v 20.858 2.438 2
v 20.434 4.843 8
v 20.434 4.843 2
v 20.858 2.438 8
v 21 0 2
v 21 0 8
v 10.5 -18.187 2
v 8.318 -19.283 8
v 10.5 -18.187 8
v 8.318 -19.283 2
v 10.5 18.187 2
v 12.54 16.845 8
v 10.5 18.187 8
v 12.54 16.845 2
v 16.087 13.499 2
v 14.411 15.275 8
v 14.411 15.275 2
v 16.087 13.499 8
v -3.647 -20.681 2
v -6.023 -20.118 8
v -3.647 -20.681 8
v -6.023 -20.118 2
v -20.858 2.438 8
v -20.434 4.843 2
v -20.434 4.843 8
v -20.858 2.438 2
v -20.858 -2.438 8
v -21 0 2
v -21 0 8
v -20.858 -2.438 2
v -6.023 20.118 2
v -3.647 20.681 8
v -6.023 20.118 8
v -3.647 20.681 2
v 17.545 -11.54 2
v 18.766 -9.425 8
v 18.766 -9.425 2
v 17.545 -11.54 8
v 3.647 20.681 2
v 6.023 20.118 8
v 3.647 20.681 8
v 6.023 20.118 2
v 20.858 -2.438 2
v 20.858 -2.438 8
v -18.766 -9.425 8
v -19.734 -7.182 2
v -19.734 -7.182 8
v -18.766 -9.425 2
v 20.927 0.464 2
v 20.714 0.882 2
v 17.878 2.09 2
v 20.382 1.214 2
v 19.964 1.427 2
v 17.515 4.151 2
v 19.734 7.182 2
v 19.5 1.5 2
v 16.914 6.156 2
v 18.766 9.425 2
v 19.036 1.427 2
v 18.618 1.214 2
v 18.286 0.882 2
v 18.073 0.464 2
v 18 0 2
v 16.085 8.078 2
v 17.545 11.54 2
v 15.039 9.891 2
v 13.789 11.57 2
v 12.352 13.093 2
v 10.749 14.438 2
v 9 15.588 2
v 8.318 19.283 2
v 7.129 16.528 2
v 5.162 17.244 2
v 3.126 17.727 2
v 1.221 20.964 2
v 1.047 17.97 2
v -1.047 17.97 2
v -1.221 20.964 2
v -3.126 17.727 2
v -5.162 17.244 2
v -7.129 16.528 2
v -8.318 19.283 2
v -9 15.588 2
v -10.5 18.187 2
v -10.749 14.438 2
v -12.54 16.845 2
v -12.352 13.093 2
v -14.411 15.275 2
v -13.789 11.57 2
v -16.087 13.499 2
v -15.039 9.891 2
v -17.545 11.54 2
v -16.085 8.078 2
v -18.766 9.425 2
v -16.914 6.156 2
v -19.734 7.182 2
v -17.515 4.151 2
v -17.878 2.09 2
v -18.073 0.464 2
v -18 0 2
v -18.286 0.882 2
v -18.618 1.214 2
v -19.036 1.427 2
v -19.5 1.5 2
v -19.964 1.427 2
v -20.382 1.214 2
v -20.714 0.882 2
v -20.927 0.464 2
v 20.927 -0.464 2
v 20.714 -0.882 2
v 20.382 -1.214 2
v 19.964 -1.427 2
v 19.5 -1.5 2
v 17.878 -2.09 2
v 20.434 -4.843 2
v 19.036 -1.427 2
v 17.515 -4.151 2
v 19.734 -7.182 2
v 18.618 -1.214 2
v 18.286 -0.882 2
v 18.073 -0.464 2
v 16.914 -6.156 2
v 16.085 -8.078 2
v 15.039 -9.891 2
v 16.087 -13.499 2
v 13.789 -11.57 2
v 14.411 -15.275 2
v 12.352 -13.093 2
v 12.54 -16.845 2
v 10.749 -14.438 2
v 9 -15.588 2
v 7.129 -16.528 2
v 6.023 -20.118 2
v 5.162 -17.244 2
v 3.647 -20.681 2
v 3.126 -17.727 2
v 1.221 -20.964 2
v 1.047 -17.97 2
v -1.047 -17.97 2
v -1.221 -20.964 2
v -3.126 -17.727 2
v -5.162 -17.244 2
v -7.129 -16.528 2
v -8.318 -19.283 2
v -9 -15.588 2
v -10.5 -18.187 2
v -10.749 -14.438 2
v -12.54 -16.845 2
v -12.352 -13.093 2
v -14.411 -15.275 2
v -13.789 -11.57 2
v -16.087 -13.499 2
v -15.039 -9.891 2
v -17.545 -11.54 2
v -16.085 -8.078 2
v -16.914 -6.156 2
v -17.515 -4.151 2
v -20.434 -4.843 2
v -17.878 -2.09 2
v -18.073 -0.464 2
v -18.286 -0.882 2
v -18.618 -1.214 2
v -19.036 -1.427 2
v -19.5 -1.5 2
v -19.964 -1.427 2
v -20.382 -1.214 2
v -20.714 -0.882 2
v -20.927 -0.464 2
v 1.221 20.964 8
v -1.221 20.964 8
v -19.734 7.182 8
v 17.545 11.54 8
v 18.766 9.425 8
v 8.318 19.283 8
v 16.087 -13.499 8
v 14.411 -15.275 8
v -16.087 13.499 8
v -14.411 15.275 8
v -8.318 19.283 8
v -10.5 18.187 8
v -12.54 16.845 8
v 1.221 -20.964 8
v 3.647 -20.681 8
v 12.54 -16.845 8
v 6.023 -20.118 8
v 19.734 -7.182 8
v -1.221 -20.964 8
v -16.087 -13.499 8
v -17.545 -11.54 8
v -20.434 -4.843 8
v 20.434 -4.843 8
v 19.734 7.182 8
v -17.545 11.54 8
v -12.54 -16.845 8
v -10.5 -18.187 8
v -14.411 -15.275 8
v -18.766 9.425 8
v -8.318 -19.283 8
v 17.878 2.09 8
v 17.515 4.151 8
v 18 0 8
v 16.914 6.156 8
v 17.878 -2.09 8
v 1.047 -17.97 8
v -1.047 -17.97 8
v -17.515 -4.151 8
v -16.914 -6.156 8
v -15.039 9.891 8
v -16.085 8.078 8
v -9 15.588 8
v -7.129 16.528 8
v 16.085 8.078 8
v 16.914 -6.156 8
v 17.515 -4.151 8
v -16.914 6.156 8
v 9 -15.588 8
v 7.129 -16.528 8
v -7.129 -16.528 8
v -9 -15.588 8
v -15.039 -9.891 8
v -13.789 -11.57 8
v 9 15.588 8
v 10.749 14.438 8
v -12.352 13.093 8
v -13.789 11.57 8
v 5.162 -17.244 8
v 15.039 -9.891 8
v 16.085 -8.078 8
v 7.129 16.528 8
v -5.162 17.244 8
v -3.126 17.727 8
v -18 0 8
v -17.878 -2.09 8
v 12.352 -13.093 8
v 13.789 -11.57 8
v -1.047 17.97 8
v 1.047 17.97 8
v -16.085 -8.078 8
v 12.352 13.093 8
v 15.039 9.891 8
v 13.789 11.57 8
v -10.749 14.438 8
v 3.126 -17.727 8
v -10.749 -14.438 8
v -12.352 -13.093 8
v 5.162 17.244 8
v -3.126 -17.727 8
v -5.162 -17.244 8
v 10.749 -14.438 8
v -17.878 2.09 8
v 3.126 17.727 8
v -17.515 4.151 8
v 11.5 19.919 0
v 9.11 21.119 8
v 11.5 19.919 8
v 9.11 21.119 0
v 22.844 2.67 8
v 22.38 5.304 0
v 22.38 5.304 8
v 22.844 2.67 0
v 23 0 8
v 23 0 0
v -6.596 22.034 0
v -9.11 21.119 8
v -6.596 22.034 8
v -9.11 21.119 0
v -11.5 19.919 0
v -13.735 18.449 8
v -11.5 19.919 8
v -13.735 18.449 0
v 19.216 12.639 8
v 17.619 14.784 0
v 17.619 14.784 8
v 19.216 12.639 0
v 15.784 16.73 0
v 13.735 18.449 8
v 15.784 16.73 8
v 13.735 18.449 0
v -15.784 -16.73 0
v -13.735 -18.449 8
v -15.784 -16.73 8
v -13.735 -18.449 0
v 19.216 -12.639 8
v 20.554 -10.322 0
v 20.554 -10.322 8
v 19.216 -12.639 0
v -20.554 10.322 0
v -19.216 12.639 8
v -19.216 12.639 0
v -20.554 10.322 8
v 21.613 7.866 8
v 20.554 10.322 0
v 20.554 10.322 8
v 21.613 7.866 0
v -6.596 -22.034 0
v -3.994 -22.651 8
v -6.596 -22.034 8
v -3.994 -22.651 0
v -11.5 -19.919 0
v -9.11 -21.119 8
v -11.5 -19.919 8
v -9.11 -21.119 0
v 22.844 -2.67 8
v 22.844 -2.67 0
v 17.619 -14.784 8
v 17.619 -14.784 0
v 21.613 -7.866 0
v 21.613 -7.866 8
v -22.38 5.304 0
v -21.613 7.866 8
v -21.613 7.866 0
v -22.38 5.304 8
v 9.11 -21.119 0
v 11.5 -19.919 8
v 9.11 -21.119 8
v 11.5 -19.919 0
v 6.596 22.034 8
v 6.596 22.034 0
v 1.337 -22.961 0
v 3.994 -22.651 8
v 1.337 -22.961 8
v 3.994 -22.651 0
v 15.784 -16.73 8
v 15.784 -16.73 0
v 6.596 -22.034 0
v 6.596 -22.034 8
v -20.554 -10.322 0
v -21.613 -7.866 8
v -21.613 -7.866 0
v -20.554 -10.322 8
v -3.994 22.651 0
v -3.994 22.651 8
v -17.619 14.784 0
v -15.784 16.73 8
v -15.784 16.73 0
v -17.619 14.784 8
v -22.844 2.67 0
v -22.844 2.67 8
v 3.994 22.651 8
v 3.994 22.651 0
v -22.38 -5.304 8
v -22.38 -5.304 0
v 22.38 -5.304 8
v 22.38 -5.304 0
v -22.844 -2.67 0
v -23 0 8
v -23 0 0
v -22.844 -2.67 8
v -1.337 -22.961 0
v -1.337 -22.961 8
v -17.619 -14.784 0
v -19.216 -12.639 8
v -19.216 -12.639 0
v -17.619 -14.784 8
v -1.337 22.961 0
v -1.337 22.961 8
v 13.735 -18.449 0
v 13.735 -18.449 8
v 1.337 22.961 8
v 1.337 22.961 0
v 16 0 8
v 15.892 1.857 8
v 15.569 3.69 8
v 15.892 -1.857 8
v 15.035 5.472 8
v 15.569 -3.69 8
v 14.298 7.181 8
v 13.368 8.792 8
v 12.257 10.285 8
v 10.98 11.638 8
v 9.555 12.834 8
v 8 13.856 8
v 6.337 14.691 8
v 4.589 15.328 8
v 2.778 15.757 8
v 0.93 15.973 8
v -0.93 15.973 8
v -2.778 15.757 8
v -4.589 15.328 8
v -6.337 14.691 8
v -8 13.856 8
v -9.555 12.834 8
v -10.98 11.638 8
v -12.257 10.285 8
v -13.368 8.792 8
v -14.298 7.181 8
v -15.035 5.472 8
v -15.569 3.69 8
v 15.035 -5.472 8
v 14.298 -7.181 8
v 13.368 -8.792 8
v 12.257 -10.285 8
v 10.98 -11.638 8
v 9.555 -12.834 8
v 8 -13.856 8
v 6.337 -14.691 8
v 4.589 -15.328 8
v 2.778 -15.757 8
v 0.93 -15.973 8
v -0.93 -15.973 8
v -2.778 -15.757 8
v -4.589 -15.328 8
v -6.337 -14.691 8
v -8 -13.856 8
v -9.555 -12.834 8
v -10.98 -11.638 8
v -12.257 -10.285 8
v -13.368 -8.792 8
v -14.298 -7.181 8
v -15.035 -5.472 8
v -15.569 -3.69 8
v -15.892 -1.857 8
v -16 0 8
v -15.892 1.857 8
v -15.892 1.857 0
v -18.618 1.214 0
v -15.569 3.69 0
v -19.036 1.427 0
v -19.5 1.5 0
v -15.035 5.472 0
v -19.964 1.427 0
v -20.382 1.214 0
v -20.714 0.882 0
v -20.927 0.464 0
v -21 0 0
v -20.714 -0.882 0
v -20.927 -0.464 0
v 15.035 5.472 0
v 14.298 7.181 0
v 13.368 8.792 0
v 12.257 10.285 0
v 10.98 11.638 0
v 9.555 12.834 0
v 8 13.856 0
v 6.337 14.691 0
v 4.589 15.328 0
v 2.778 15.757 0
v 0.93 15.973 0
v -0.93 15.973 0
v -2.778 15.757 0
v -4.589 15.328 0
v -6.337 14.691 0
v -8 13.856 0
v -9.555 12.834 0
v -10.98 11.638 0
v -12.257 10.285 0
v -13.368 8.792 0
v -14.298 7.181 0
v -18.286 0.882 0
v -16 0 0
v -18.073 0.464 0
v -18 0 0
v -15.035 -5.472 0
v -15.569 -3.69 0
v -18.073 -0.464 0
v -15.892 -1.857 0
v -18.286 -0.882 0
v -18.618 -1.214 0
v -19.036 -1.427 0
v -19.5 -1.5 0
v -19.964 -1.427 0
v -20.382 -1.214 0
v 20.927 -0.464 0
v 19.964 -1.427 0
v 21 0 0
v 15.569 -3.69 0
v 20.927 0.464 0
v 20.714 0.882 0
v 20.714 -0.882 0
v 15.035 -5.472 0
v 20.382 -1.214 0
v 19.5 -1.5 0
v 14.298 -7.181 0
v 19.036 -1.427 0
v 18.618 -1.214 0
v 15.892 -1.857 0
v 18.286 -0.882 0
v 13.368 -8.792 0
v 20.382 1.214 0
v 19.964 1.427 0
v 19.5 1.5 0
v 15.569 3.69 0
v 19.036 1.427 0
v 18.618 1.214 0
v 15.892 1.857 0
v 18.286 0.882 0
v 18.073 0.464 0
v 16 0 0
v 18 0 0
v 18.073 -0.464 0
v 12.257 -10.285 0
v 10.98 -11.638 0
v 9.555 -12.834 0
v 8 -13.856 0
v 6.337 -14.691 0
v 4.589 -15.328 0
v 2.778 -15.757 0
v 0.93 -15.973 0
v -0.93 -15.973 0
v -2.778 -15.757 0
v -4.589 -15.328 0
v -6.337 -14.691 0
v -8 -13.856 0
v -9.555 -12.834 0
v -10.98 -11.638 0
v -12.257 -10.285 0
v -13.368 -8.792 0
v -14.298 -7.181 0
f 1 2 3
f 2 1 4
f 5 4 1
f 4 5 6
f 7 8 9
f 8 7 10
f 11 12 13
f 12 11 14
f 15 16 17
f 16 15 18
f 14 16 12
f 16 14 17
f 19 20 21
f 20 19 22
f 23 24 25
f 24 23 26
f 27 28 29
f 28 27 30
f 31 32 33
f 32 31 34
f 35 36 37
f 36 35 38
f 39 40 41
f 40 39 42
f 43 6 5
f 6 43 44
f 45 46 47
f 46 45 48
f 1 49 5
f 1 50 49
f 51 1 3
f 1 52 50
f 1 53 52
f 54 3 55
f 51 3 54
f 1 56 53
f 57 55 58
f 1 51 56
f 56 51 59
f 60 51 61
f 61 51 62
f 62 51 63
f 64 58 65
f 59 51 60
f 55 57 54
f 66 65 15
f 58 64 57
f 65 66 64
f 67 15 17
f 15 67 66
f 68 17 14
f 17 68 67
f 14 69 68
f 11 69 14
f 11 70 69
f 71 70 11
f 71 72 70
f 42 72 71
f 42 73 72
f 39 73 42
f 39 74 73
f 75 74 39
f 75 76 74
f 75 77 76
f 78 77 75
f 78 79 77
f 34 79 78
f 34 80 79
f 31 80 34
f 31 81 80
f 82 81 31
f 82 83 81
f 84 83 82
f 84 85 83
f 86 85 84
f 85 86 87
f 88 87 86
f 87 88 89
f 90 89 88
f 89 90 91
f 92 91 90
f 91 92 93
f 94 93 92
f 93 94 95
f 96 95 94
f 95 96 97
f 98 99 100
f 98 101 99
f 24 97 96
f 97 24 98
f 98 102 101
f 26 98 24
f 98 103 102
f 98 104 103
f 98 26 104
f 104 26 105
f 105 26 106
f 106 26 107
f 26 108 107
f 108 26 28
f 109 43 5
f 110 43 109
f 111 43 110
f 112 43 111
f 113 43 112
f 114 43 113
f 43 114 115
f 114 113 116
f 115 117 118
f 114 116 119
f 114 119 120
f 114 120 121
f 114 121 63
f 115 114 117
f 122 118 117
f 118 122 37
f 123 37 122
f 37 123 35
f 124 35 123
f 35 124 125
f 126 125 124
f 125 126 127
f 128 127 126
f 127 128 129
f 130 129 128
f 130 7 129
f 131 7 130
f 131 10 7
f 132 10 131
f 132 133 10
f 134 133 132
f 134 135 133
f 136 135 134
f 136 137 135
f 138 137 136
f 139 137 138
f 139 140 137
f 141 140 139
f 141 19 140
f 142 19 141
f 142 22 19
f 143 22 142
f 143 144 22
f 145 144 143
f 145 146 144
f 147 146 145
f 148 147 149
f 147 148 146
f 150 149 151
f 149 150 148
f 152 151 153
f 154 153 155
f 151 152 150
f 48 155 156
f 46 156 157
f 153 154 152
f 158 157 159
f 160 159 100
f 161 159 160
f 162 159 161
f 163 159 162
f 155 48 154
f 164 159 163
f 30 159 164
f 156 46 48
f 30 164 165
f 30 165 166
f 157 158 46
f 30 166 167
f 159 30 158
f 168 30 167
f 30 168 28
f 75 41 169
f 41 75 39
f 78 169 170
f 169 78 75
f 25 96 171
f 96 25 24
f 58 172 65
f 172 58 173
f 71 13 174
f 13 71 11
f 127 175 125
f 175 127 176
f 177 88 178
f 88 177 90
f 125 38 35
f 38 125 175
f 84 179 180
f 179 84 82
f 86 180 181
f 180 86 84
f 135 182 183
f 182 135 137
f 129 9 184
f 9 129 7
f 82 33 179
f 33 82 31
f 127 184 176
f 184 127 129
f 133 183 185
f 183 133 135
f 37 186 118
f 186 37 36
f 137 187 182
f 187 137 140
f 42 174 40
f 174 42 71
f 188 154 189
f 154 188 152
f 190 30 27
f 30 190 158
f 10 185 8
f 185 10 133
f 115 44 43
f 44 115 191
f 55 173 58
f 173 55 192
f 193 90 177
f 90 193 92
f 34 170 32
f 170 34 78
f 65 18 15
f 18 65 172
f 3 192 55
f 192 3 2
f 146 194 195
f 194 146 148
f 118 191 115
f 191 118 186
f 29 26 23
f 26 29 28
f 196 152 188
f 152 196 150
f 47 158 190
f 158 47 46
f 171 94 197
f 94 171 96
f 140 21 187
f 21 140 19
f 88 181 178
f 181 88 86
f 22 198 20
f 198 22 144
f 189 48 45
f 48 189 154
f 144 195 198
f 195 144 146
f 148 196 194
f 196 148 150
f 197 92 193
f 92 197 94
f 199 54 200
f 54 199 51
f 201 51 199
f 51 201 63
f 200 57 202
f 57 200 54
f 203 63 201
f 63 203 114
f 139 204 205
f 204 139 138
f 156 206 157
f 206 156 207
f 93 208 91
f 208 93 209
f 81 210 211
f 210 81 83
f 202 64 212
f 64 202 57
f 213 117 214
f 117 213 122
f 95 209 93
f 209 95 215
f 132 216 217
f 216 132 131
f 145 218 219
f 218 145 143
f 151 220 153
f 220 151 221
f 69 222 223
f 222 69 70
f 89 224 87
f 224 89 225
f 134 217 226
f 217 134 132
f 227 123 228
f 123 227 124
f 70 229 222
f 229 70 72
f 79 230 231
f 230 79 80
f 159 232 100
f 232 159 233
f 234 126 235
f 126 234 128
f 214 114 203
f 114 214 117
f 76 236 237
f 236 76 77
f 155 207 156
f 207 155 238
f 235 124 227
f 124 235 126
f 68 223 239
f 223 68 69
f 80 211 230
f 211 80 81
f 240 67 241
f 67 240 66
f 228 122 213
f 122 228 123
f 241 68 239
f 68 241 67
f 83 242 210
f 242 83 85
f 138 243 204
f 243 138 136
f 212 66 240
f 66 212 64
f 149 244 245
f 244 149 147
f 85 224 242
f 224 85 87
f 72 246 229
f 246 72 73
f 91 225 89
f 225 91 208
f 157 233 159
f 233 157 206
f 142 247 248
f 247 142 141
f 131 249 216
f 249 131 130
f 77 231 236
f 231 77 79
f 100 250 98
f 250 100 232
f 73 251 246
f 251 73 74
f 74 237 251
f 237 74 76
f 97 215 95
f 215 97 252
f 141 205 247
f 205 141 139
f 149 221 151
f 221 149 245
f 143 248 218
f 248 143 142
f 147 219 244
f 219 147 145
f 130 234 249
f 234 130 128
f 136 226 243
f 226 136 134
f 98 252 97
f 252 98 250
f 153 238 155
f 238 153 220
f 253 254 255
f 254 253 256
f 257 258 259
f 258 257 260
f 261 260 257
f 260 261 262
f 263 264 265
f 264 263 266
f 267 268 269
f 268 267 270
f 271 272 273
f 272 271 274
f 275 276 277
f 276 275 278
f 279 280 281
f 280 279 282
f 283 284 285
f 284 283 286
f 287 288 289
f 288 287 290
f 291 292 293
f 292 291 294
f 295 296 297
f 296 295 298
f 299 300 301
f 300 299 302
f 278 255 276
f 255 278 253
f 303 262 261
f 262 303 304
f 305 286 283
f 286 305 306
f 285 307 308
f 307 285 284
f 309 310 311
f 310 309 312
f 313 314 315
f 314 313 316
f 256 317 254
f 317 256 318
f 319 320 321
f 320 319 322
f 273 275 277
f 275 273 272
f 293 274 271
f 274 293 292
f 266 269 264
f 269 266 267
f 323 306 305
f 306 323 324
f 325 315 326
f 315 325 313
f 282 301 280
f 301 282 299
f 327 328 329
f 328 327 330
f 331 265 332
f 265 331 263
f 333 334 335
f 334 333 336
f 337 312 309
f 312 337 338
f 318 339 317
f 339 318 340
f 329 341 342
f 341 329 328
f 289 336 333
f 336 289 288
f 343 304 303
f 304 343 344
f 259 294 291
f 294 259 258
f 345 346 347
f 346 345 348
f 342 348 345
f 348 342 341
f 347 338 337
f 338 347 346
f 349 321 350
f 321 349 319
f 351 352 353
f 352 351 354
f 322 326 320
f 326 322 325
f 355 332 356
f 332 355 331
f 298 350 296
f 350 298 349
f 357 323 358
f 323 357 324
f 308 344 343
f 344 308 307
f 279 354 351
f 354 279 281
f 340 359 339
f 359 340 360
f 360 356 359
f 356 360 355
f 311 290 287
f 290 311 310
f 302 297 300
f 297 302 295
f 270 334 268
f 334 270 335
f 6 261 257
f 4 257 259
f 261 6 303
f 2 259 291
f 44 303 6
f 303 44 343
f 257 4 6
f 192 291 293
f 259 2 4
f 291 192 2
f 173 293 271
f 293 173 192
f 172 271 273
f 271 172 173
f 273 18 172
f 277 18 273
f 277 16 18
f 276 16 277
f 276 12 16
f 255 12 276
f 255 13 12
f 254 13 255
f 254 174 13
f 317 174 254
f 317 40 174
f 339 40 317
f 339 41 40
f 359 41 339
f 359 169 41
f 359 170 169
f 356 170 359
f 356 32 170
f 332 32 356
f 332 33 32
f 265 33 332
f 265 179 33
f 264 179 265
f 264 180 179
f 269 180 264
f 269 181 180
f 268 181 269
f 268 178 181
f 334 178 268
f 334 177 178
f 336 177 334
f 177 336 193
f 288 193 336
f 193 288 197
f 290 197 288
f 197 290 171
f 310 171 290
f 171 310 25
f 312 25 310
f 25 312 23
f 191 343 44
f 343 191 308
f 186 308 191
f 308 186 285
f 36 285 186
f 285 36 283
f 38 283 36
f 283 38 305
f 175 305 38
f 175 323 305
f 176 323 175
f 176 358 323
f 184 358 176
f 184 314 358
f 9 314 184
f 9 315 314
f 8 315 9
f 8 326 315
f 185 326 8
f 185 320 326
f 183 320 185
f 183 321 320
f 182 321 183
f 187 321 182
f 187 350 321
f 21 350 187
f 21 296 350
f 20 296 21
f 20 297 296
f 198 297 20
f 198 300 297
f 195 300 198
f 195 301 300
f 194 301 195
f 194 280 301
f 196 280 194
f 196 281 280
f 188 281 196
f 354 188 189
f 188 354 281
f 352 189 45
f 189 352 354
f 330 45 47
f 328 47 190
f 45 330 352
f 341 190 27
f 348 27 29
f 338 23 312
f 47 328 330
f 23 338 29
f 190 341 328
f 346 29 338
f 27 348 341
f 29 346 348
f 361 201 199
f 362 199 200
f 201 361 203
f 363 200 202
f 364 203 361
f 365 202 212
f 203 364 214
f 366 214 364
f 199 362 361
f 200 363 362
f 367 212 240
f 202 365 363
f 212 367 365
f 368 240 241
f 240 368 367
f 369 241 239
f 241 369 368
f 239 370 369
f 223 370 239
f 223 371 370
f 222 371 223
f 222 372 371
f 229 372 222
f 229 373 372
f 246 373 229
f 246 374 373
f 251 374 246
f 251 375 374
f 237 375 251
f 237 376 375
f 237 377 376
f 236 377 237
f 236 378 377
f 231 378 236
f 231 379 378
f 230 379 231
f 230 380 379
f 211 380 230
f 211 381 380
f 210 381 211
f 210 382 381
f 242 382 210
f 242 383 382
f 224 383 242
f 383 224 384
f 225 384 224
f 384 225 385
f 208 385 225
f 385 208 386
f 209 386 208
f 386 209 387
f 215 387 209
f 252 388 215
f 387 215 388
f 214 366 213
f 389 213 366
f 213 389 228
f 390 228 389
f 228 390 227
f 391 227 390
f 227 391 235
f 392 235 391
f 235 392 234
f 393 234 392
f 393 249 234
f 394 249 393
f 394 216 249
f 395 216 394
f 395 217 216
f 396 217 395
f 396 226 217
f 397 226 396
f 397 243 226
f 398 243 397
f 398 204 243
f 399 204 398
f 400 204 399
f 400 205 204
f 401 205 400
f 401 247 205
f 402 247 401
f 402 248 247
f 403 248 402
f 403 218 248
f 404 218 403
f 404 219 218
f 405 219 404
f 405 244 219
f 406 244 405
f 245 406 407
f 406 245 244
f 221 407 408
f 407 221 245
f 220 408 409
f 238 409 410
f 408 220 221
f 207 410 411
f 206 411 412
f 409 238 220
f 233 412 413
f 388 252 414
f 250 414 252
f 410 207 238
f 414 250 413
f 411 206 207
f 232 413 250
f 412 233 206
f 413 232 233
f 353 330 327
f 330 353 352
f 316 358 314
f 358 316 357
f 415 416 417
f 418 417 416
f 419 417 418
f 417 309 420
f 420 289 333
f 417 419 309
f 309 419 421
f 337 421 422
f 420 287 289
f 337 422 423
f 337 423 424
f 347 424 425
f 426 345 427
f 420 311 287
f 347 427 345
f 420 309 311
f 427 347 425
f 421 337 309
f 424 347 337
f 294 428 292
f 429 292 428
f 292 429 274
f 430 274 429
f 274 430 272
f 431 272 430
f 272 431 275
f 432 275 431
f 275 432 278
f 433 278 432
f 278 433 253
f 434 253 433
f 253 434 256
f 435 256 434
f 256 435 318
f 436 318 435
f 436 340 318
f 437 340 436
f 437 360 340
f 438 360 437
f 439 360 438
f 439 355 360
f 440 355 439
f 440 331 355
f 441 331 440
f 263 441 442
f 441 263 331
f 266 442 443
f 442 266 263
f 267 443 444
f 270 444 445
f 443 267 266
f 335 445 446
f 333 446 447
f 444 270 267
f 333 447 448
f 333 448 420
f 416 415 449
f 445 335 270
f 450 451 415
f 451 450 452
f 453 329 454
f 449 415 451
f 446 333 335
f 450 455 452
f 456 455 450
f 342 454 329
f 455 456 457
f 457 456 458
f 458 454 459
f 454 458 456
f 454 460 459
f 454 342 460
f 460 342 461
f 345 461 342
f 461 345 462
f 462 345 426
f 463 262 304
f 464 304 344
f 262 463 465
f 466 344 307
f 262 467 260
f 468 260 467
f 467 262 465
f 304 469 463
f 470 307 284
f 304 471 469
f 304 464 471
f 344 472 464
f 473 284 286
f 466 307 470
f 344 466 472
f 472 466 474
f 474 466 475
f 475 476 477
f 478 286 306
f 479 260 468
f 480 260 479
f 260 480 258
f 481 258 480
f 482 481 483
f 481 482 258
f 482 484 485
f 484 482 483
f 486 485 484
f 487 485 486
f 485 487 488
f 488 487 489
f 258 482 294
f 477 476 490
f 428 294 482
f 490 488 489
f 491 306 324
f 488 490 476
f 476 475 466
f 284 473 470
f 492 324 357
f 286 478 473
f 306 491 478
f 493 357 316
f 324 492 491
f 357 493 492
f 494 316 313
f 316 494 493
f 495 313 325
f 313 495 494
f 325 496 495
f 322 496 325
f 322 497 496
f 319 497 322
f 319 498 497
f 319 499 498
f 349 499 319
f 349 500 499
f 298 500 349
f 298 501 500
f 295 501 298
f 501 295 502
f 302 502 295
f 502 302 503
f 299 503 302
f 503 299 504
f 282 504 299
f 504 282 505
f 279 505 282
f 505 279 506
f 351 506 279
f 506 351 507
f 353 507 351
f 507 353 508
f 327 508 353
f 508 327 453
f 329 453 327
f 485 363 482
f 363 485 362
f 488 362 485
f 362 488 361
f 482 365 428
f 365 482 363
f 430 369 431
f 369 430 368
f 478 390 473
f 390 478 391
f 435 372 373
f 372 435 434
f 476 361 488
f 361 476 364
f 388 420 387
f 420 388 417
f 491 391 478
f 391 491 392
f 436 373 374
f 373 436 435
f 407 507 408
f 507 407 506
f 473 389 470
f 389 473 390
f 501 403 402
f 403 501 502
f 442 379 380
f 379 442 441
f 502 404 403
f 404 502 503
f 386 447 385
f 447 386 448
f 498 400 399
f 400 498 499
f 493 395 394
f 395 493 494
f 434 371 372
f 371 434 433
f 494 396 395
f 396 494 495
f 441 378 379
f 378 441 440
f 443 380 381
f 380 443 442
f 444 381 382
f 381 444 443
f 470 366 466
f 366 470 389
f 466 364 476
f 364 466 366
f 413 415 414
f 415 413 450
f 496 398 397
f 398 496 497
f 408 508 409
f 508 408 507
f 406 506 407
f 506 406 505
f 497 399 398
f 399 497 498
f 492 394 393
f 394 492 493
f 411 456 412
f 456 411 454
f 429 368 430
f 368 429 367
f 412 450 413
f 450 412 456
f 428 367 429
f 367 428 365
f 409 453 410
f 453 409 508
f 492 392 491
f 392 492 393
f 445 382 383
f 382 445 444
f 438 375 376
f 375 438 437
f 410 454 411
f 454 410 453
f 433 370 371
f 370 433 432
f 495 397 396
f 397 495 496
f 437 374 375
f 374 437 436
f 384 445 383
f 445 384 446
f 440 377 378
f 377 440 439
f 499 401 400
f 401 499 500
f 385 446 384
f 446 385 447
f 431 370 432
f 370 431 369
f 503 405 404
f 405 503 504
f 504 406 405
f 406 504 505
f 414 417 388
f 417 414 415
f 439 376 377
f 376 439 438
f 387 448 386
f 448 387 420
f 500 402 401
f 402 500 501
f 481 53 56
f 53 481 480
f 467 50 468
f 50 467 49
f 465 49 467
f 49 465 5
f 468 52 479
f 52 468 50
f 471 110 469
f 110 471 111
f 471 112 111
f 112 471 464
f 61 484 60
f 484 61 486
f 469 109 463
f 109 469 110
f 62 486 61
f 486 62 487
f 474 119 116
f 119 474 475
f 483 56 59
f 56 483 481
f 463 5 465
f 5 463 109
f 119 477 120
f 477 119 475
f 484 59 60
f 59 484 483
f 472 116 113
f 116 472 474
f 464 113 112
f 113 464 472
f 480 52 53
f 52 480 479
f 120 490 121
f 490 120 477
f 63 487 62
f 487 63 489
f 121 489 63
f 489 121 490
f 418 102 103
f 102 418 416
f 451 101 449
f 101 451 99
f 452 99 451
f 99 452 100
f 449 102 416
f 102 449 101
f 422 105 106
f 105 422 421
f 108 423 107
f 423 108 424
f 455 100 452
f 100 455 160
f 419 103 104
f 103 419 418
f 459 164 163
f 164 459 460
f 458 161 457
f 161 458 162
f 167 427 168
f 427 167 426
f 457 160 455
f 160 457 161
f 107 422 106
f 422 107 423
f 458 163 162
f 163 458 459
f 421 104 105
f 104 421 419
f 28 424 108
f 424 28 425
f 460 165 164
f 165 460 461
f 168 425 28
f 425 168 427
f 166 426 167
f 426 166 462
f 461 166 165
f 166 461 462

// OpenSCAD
//o radio interno do neumatico, exterior da roda
radio=18;

//o espesor da goma que queremos
espesor=3;

//o ancho do neumatico
ancho=6;

difference(){
	//externo molde
		cylinder(r=radio+espesor+2,h=ancho+2,$fn=radio*3);
		difference(){
			//externo neumatico
				translate([0,0,2]) cylinder(r=radio+espesor,h=ancho+2,$fn=radio*3);
			
			//interno neumatico
				translate([0,0,2]) cylinder(r=radio,h=ancho+2,$fn=radio*3);
		}
	//oco
	cylinder(r=radio-2,h=ancho+4,$fn=radio*3);
	//ocos purga
		translate([radio+espesor/2,0,0]) cylinder(r=espesor/2,h=2,$fn=20);
		translate([-(radio+espesor/2),0,0]) cylinder(r=espesor/2,h=2,$fn=20);
}
